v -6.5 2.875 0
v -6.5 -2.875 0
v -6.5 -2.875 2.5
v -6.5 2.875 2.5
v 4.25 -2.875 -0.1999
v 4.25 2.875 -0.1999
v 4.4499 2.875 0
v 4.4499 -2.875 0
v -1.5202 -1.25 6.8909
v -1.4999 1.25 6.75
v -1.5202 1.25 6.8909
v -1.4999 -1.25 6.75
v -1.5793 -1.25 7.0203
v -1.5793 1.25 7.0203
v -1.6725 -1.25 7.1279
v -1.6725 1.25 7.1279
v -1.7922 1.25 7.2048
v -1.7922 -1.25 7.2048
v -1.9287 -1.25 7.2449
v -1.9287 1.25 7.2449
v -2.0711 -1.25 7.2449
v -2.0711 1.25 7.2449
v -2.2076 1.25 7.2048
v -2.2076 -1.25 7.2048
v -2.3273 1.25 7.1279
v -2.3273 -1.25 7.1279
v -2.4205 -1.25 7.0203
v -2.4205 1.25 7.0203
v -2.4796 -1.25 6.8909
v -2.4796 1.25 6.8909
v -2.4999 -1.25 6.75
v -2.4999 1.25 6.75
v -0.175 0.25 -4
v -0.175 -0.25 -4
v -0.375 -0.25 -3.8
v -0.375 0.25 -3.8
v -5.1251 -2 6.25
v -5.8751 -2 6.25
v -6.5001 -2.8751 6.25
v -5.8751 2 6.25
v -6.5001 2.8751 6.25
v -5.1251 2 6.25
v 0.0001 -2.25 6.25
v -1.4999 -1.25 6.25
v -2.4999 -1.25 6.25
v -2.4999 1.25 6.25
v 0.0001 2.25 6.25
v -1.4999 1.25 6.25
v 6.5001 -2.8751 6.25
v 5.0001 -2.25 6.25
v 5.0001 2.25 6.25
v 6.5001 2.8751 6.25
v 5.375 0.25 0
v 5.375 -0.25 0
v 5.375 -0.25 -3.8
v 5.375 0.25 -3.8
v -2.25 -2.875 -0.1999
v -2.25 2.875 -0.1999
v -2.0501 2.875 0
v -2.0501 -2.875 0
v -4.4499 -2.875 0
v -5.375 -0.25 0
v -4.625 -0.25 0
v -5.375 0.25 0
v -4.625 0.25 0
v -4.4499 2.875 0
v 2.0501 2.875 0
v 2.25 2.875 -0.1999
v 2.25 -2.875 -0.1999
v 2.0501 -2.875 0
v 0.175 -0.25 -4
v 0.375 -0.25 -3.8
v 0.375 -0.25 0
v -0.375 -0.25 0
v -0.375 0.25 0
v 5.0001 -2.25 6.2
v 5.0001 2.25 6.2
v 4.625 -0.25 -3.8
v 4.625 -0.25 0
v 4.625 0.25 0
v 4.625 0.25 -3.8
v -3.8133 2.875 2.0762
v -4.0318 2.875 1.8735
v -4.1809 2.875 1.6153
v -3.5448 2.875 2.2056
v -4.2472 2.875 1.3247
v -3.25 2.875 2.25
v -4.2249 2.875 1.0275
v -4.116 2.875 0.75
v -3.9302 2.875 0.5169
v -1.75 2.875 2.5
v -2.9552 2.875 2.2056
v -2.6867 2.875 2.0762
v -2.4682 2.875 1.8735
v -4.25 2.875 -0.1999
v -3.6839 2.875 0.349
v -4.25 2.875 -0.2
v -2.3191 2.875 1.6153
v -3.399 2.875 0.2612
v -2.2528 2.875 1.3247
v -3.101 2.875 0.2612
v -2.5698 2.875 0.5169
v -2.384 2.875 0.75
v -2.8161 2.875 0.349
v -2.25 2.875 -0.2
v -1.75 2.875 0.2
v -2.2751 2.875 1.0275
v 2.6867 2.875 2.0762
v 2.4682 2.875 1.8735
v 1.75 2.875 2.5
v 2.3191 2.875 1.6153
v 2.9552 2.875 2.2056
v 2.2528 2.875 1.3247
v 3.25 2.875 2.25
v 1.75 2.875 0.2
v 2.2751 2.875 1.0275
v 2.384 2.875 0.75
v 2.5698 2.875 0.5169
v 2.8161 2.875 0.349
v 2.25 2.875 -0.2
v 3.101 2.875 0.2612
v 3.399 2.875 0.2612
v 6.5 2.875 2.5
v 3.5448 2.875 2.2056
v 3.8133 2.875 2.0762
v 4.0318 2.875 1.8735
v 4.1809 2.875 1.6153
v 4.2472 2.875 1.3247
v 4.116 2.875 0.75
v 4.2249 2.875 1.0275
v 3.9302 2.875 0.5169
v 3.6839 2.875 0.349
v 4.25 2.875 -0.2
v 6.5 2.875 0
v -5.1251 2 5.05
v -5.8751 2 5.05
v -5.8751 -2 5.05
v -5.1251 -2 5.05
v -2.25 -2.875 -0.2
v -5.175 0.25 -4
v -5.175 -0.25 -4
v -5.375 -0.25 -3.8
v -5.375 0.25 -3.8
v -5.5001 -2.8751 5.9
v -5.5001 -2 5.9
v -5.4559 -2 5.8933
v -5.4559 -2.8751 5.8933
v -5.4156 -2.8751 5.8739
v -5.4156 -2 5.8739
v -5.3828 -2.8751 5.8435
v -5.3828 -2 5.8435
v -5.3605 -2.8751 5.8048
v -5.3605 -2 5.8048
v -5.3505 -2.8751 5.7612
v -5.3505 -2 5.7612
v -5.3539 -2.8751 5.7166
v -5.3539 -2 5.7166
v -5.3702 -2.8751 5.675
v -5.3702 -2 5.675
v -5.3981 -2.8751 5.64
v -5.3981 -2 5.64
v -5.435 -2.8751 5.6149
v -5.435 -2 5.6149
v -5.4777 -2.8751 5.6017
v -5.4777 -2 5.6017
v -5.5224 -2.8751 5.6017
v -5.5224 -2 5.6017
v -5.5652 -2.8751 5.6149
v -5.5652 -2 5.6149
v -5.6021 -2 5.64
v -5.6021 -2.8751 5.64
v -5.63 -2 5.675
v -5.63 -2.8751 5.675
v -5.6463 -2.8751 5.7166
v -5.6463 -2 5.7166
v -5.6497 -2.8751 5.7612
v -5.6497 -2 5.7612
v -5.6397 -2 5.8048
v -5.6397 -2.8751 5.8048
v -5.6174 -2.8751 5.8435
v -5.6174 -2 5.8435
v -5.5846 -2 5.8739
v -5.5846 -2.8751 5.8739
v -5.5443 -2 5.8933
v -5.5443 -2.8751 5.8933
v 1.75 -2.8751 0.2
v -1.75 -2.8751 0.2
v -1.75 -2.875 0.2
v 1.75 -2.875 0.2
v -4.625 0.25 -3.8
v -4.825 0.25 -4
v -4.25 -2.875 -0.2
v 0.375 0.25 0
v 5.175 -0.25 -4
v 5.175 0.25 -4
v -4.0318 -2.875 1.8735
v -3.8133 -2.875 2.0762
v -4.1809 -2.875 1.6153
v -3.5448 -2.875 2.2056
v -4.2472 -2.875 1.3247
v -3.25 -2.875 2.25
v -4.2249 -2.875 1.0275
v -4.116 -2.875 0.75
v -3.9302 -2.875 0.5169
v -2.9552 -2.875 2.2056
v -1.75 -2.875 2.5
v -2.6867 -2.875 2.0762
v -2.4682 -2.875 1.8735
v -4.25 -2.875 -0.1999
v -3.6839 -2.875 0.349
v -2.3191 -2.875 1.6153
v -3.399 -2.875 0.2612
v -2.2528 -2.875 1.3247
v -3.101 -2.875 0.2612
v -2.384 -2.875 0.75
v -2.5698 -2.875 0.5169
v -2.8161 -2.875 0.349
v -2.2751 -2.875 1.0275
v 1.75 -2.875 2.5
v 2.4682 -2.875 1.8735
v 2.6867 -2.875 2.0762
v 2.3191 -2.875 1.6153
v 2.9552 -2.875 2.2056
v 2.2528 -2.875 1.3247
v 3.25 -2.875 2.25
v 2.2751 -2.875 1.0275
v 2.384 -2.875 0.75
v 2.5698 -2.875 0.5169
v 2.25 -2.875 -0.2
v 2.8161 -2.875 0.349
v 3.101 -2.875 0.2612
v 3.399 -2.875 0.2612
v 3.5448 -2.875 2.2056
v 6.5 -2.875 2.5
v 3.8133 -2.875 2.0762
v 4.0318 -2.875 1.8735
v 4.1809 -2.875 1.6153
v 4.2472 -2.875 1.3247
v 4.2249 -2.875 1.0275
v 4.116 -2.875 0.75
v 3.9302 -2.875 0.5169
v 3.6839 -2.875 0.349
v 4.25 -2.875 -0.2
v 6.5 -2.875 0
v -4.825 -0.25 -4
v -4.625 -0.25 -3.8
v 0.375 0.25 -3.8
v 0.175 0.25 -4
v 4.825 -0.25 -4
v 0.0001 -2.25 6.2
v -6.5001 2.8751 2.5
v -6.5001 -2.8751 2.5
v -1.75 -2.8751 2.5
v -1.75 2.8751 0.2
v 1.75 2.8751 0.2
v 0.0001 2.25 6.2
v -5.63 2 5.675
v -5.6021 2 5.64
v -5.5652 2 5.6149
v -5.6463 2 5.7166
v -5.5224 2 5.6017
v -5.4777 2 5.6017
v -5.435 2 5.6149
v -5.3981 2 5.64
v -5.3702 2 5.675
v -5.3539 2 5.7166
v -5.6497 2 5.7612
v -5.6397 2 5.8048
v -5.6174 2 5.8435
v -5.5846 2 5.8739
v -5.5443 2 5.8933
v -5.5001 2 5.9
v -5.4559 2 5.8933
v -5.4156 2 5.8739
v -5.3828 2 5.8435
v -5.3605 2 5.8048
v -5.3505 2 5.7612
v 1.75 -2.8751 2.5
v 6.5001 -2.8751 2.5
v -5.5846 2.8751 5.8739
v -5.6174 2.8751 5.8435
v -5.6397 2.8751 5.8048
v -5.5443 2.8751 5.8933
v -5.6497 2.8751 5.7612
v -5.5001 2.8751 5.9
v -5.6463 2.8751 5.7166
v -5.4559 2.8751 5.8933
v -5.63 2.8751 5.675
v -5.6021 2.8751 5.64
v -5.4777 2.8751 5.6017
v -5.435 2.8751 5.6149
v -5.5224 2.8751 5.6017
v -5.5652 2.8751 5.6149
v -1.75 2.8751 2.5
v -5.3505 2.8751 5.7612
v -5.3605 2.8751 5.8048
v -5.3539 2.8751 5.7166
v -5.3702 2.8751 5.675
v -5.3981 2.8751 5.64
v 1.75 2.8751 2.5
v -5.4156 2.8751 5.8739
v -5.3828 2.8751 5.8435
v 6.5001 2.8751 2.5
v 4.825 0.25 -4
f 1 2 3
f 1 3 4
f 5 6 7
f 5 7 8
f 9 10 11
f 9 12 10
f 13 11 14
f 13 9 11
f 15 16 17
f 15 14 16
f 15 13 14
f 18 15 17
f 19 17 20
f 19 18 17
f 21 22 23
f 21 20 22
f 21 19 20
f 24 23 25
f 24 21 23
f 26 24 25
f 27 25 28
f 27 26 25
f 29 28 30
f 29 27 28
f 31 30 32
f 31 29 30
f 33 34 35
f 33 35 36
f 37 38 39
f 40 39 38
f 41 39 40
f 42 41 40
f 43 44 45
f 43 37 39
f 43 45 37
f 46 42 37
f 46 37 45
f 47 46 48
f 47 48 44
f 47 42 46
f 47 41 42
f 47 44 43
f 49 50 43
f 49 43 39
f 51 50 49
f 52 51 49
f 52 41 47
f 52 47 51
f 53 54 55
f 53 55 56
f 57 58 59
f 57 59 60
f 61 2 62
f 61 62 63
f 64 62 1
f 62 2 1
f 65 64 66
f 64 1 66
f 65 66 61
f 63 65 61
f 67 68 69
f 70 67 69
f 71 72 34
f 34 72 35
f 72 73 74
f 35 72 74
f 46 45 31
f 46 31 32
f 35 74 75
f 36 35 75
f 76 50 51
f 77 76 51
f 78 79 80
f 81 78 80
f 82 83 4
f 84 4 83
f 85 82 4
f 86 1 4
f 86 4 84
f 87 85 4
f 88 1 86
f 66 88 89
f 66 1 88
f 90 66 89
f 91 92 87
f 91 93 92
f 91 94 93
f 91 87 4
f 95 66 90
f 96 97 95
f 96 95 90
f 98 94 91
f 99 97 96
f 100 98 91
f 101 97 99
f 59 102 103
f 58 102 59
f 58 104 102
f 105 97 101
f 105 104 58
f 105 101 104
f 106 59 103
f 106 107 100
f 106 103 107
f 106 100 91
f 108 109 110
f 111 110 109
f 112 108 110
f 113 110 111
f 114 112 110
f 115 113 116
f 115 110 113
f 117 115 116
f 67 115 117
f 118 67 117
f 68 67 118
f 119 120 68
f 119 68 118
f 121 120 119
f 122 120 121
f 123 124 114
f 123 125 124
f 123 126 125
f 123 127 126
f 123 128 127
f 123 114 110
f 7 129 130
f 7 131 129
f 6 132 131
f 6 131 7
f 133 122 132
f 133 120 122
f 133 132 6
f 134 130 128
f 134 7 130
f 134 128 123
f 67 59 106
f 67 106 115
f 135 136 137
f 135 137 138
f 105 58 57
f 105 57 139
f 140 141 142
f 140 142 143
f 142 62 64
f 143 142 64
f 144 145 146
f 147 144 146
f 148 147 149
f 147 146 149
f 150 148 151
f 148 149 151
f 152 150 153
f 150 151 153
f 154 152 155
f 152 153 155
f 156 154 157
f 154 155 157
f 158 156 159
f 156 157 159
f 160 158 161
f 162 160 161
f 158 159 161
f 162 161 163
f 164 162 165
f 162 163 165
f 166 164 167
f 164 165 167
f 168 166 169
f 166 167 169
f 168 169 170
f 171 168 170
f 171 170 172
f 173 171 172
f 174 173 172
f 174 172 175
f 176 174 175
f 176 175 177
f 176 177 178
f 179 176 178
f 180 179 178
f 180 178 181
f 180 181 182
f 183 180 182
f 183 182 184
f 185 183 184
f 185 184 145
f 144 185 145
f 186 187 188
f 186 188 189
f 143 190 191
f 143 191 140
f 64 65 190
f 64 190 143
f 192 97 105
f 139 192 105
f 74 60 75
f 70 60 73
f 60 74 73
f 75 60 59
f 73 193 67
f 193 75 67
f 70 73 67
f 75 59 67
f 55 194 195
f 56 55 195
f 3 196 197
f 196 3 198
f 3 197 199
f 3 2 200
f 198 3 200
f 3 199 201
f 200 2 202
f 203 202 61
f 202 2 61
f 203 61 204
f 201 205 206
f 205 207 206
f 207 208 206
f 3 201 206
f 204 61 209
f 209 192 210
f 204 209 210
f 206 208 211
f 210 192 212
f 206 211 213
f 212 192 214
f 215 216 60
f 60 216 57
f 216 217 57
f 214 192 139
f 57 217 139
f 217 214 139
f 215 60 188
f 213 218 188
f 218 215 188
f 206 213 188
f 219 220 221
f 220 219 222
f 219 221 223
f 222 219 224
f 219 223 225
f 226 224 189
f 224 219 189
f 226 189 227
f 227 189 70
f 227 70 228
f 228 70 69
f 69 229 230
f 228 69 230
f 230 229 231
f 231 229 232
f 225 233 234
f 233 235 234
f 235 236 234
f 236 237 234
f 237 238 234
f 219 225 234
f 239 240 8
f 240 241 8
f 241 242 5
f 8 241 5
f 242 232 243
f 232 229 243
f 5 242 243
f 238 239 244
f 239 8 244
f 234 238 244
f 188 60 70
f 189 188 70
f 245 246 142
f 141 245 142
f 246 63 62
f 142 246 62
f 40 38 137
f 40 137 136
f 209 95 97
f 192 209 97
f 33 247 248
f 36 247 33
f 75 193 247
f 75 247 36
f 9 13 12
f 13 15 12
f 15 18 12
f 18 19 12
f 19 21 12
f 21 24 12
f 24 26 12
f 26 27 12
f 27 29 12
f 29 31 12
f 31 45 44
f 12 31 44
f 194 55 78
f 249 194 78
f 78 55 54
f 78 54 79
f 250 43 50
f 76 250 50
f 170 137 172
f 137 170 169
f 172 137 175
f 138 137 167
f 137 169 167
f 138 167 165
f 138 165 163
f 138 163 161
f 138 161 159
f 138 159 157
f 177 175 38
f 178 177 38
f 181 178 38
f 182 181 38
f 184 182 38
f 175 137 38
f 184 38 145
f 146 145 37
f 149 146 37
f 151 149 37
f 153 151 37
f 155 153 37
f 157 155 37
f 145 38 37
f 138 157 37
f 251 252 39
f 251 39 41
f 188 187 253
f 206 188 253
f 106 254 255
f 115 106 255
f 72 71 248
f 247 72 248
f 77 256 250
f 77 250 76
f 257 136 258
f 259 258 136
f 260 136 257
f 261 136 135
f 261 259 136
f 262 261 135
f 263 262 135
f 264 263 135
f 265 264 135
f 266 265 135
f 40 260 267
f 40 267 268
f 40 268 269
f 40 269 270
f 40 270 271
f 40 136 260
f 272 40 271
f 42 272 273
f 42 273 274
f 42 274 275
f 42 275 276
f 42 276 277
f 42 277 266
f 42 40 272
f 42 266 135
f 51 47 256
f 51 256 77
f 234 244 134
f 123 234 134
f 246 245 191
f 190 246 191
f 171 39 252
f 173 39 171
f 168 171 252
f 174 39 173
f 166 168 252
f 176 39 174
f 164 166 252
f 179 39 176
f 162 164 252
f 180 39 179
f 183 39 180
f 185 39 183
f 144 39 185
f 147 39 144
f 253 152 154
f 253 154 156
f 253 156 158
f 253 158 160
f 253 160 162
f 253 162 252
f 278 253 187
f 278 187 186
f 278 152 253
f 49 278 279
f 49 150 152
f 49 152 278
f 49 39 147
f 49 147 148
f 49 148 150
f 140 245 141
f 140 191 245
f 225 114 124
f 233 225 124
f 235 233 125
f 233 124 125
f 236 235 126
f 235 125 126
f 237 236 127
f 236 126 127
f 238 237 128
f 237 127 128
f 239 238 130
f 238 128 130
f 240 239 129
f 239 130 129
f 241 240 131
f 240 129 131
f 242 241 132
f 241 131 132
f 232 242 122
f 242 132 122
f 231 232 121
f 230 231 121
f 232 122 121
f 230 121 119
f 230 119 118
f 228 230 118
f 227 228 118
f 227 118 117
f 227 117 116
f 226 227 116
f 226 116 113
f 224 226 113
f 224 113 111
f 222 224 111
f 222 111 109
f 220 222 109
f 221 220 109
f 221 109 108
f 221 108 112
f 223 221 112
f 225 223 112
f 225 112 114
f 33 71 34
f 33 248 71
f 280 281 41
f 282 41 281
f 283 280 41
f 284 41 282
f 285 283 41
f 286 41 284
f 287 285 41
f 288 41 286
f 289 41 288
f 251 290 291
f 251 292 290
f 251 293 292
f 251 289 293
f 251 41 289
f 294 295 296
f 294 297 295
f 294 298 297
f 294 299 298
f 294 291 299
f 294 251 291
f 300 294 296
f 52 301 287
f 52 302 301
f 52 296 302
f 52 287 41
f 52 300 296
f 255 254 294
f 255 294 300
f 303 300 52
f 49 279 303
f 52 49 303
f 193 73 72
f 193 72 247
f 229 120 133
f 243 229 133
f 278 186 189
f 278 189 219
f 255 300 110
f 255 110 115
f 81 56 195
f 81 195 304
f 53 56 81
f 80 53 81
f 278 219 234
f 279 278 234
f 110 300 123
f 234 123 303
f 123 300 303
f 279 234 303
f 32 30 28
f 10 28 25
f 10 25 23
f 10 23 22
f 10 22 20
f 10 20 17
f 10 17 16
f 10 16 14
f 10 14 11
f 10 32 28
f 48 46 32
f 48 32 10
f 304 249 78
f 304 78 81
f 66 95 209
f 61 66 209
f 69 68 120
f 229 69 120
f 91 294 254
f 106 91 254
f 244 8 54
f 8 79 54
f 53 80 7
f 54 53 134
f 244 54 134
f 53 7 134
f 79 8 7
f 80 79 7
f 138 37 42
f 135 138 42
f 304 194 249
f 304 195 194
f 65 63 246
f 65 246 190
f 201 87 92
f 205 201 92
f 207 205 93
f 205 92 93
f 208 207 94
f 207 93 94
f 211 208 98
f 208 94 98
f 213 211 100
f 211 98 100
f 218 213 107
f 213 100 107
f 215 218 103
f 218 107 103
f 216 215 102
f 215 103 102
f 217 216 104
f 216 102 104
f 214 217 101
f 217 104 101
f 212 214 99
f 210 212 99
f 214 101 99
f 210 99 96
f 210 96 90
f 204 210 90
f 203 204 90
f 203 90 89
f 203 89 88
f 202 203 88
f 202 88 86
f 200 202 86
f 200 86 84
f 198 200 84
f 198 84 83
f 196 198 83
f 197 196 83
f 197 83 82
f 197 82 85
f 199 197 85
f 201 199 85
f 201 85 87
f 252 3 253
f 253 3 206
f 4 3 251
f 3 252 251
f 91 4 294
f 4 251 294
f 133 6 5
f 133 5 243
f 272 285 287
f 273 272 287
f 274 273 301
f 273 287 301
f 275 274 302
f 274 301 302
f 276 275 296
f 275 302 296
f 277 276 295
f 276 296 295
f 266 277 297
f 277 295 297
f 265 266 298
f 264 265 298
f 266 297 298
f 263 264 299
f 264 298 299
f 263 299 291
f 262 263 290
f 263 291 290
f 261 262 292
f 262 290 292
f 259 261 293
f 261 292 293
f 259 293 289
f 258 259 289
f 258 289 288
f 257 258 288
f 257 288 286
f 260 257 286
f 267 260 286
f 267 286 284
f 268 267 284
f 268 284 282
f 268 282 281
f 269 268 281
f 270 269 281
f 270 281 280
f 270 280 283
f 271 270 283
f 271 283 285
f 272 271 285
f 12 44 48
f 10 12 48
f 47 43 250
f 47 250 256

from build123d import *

# Parameters (mm, degrees)
SKETCH1_W            = 13
SKETCH1_H            = 5.75
BOSS_EXTRUDE1_DEPTH  = 2.5
SKETCH2_W            = 0.75
SKETCH2_H            = 0.5
BOSS_EXTRUDE2_DEPTH  = 4
CHAMFER1_SIZE        = 0.2
SKETCH4_R            = 1
CUT_EXTRUDE1_DEPTH   = 6
SKETCH5_W            = 2
SKETCH5_H            = 0.2
BOSS_EXTRUDE3_DEPTH  = 5.75
CHAMFER2_SIZE        = 0.2
SKETCH10_W           = 13.0002
SKETCH10_H           = 5.7502
BOSS_EXTRUDE8_DEPTH  = 3.75
SKETCH11_W           = 3.5
SKETCH11_H           = 2.3
BOSS_EXTRUDE9_DEPTH  = 0.5
SKETCH12_W           = 3.5
SKETCH12_H           = 2.3
BOSS_EXTRUDE10_DEPTH = 0.5
SKETCH13_W           = 1
SKETCH13_H           = 2.5
BOSS_EXTRUDE11_DEPTH = 1
FILLET2_RADIUS       = 0.5
FILLET2_LENGTH       = 2.5
SKETCH14_W           = 5
SKETCH14_H           = 4.5
CUT_EXTRUDE2_DEPTH   = 0.05
SKETCH15_R           = 0.15
CUT_EXTRUDE3_DEPTH   = 10
SKETCH16_W           = 0.75
SKETCH16_H           = 4
CUT_EXTRUDE4_DEPTH   = 1.2


with BuildPart() as part:
    # Sketch1 → Boss-Extrude1 (new body)
    with BuildSketch(Plane.XY):
        Rectangle(SKETCH1_W, SKETCH1_H)
    extrude(amount=BOSS_EXTRUDE1_DEPTH)

    # Sketch2 → Boss-Extrude2 (add)
    with BuildSketch(Plane(origin=(0, 0, 0), x_dir=(-1, 0, 0), z_dir=(0, 0, -1))):
        Rectangle(SKETCH2_W, SKETCH2_H)
        with Locations((-5, 0)):
            Rectangle(SKETCH2_W, SKETCH2_H)
        with Locations((5, 0)):
            Rectangle(SKETCH2_W, SKETCH2_H)
    extrude(amount=BOSS_EXTRUDE2_DEPTH)

    # Chamfer1
    chamfer1_edges = [part.edges().sort_by_distance(p)[0] for p in [
        (-0.375, 0, -4),
        (0.375, 0, -4),
        (4.625, 0, -4),
        (5.375, 0, -4),
        (-5.375, 0, -4),
        (-4.625, 0, -4),
    ]]
    chamfer(chamfer1_edges, length=CHAMFER1_SIZE)

    # Sketch4 → Cut-Extrude1 (cut)
    with BuildSketch(Plane(origin=(0, 2.875, 0), x_dir=(1, 0, 0), z_dir=(0, 1, 0))):
        with Locations(Location((-3.25, -1.25, 0), (0, 0, 270))):
            Circle(SKETCH4_R)
        with Locations(Location((3.25, -1.25, 0), (0, 0, 270))):
            Circle(SKETCH4_R)
    extrude(amount=-CUT_EXTRUDE1_DEPTH, mode=Mode.SUBTRACT)

    # Sketch5 → Boss-Extrude3 (add)
    with BuildSketch(Plane(origin=(0, 2.875, 0), x_dir=(1, 0, 0), z_dir=(0, 1, 0))):
        with Locations((-3.25, 0.1)):
            Rectangle(SKETCH5_W, SKETCH5_H)
        with Locations((3.25, 0.1)):
            Rectangle(SKETCH5_W, SKETCH5_H)
    extrude(amount=-BOSS_EXTRUDE3_DEPTH)

    # Chamfer2
    chamfer2_edges = [part.edges().sort_by_distance(p)[0] for p in [
        (4.25, 0, 0),
        (2.25, 0, 0),
        (-2.25, 0, 0),
        (-4.25, 0, 0),
    ]]
    chamfer(chamfer2_edges, length=CHAMFER2_SIZE - 0.0001)  # a hair under: the kernel refuses the full size

    # Sketch10 → Boss-Extrude8 (add)
    with BuildSketch(Plane.XY.offset(2.5)):
        Rectangle(SKETCH10_W, SKETCH10_H)
    extrude(amount=BOSS_EXTRUDE8_DEPTH)

    # Sketch11 → Boss-Extrude9 (add)
    with BuildSketch(Plane.XZ.offset(2.8751)):
        with Locations((0, 1.35)):
            Rectangle(SKETCH11_W, SKETCH11_H)
    extrude(amount=-BOSS_EXTRUDE9_DEPTH)

    # Sketch12 → Boss-Extrude10 (add)
    with BuildSketch(Plane(origin=(0, 2.8751, 0), x_dir=(1, 0, 0), z_dir=(0, 1, 0))):
        with Locations((0, -1.35)):
            Rectangle(SKETCH12_W, SKETCH12_H)
    extrude(amount=-BOSS_EXTRUDE10_DEPTH)

    # Sketch13 → Boss-Extrude11 (add)
    with BuildSketch(Plane.XY.offset(6.25)):
        with Locations((-1.9999, 0)):
            Rectangle(SKETCH13_W, SKETCH13_H)
    extrude(amount=BOSS_EXTRUDE11_DEPTH)

    # Fillet2: full round fillet: the end face becomes a half cylinder, R = half its width
    fillet2_face = Plane((-1.9999, 0, 7.25), x_dir=(0, -1, 0), z_dir=(0, 0, 1))  # on the end face: x along it, z out of the body
    fillet2_slab = fillet2_face.offset(-FILLET2_RADIUS / 2) * Box(FILLET2_LENGTH, 2 * FILLET2_RADIUS, FILLET2_RADIUS, mode=Mode.PRIVATE)  # the body's end, R deep
    fillet2_round = Plane((-1.9999, 0, 6.75), x_dir=(0, 0, 1), z_dir=(0, -1, 0)) * Cylinder(FILLET2_RADIUS, FILLET2_LENGTH, mode=Mode.PRIVATE)  # its axis R under the face
    add(fillet2_slab - fillet2_round, mode=Mode.SUBTRACT)

    # Sketch14 → Cut-Extrude2 (cut)
    with BuildSketch(Plane.XY.offset(6.25)):
        with Locations((2.5001, 0)):
            Rectangle(SKETCH14_W, SKETCH14_H)
    extrude(amount=-CUT_EXTRUDE2_DEPTH, mode=Mode.SUBTRACT)

    # Sketch15 → Cut-Extrude3 (cut)
    with BuildSketch(Plane(origin=(0, 2.8751, 0), x_dir=(1, 0, 0), z_dir=(0, 1, 0))):
        with Locations(Location((-5.500093333, -5.75, 0), (0, 0, 270))):
            Circle(SKETCH15_R)
    extrude(amount=-CUT_EXTRUDE3_DEPTH, mode=Mode.SUBTRACT)

    # Sketch16 → Cut-Extrude4 (cut)
    with BuildSketch(Plane.XY.offset(6.25)):
        with Locations((-5.5001, 0)):
            Rectangle(SKETCH16_W, SKETCH16_H)
    extrude(amount=-CUT_EXTRUDE4_DEPTH, mode=Mode.SUBTRACT)


solid = part.part
